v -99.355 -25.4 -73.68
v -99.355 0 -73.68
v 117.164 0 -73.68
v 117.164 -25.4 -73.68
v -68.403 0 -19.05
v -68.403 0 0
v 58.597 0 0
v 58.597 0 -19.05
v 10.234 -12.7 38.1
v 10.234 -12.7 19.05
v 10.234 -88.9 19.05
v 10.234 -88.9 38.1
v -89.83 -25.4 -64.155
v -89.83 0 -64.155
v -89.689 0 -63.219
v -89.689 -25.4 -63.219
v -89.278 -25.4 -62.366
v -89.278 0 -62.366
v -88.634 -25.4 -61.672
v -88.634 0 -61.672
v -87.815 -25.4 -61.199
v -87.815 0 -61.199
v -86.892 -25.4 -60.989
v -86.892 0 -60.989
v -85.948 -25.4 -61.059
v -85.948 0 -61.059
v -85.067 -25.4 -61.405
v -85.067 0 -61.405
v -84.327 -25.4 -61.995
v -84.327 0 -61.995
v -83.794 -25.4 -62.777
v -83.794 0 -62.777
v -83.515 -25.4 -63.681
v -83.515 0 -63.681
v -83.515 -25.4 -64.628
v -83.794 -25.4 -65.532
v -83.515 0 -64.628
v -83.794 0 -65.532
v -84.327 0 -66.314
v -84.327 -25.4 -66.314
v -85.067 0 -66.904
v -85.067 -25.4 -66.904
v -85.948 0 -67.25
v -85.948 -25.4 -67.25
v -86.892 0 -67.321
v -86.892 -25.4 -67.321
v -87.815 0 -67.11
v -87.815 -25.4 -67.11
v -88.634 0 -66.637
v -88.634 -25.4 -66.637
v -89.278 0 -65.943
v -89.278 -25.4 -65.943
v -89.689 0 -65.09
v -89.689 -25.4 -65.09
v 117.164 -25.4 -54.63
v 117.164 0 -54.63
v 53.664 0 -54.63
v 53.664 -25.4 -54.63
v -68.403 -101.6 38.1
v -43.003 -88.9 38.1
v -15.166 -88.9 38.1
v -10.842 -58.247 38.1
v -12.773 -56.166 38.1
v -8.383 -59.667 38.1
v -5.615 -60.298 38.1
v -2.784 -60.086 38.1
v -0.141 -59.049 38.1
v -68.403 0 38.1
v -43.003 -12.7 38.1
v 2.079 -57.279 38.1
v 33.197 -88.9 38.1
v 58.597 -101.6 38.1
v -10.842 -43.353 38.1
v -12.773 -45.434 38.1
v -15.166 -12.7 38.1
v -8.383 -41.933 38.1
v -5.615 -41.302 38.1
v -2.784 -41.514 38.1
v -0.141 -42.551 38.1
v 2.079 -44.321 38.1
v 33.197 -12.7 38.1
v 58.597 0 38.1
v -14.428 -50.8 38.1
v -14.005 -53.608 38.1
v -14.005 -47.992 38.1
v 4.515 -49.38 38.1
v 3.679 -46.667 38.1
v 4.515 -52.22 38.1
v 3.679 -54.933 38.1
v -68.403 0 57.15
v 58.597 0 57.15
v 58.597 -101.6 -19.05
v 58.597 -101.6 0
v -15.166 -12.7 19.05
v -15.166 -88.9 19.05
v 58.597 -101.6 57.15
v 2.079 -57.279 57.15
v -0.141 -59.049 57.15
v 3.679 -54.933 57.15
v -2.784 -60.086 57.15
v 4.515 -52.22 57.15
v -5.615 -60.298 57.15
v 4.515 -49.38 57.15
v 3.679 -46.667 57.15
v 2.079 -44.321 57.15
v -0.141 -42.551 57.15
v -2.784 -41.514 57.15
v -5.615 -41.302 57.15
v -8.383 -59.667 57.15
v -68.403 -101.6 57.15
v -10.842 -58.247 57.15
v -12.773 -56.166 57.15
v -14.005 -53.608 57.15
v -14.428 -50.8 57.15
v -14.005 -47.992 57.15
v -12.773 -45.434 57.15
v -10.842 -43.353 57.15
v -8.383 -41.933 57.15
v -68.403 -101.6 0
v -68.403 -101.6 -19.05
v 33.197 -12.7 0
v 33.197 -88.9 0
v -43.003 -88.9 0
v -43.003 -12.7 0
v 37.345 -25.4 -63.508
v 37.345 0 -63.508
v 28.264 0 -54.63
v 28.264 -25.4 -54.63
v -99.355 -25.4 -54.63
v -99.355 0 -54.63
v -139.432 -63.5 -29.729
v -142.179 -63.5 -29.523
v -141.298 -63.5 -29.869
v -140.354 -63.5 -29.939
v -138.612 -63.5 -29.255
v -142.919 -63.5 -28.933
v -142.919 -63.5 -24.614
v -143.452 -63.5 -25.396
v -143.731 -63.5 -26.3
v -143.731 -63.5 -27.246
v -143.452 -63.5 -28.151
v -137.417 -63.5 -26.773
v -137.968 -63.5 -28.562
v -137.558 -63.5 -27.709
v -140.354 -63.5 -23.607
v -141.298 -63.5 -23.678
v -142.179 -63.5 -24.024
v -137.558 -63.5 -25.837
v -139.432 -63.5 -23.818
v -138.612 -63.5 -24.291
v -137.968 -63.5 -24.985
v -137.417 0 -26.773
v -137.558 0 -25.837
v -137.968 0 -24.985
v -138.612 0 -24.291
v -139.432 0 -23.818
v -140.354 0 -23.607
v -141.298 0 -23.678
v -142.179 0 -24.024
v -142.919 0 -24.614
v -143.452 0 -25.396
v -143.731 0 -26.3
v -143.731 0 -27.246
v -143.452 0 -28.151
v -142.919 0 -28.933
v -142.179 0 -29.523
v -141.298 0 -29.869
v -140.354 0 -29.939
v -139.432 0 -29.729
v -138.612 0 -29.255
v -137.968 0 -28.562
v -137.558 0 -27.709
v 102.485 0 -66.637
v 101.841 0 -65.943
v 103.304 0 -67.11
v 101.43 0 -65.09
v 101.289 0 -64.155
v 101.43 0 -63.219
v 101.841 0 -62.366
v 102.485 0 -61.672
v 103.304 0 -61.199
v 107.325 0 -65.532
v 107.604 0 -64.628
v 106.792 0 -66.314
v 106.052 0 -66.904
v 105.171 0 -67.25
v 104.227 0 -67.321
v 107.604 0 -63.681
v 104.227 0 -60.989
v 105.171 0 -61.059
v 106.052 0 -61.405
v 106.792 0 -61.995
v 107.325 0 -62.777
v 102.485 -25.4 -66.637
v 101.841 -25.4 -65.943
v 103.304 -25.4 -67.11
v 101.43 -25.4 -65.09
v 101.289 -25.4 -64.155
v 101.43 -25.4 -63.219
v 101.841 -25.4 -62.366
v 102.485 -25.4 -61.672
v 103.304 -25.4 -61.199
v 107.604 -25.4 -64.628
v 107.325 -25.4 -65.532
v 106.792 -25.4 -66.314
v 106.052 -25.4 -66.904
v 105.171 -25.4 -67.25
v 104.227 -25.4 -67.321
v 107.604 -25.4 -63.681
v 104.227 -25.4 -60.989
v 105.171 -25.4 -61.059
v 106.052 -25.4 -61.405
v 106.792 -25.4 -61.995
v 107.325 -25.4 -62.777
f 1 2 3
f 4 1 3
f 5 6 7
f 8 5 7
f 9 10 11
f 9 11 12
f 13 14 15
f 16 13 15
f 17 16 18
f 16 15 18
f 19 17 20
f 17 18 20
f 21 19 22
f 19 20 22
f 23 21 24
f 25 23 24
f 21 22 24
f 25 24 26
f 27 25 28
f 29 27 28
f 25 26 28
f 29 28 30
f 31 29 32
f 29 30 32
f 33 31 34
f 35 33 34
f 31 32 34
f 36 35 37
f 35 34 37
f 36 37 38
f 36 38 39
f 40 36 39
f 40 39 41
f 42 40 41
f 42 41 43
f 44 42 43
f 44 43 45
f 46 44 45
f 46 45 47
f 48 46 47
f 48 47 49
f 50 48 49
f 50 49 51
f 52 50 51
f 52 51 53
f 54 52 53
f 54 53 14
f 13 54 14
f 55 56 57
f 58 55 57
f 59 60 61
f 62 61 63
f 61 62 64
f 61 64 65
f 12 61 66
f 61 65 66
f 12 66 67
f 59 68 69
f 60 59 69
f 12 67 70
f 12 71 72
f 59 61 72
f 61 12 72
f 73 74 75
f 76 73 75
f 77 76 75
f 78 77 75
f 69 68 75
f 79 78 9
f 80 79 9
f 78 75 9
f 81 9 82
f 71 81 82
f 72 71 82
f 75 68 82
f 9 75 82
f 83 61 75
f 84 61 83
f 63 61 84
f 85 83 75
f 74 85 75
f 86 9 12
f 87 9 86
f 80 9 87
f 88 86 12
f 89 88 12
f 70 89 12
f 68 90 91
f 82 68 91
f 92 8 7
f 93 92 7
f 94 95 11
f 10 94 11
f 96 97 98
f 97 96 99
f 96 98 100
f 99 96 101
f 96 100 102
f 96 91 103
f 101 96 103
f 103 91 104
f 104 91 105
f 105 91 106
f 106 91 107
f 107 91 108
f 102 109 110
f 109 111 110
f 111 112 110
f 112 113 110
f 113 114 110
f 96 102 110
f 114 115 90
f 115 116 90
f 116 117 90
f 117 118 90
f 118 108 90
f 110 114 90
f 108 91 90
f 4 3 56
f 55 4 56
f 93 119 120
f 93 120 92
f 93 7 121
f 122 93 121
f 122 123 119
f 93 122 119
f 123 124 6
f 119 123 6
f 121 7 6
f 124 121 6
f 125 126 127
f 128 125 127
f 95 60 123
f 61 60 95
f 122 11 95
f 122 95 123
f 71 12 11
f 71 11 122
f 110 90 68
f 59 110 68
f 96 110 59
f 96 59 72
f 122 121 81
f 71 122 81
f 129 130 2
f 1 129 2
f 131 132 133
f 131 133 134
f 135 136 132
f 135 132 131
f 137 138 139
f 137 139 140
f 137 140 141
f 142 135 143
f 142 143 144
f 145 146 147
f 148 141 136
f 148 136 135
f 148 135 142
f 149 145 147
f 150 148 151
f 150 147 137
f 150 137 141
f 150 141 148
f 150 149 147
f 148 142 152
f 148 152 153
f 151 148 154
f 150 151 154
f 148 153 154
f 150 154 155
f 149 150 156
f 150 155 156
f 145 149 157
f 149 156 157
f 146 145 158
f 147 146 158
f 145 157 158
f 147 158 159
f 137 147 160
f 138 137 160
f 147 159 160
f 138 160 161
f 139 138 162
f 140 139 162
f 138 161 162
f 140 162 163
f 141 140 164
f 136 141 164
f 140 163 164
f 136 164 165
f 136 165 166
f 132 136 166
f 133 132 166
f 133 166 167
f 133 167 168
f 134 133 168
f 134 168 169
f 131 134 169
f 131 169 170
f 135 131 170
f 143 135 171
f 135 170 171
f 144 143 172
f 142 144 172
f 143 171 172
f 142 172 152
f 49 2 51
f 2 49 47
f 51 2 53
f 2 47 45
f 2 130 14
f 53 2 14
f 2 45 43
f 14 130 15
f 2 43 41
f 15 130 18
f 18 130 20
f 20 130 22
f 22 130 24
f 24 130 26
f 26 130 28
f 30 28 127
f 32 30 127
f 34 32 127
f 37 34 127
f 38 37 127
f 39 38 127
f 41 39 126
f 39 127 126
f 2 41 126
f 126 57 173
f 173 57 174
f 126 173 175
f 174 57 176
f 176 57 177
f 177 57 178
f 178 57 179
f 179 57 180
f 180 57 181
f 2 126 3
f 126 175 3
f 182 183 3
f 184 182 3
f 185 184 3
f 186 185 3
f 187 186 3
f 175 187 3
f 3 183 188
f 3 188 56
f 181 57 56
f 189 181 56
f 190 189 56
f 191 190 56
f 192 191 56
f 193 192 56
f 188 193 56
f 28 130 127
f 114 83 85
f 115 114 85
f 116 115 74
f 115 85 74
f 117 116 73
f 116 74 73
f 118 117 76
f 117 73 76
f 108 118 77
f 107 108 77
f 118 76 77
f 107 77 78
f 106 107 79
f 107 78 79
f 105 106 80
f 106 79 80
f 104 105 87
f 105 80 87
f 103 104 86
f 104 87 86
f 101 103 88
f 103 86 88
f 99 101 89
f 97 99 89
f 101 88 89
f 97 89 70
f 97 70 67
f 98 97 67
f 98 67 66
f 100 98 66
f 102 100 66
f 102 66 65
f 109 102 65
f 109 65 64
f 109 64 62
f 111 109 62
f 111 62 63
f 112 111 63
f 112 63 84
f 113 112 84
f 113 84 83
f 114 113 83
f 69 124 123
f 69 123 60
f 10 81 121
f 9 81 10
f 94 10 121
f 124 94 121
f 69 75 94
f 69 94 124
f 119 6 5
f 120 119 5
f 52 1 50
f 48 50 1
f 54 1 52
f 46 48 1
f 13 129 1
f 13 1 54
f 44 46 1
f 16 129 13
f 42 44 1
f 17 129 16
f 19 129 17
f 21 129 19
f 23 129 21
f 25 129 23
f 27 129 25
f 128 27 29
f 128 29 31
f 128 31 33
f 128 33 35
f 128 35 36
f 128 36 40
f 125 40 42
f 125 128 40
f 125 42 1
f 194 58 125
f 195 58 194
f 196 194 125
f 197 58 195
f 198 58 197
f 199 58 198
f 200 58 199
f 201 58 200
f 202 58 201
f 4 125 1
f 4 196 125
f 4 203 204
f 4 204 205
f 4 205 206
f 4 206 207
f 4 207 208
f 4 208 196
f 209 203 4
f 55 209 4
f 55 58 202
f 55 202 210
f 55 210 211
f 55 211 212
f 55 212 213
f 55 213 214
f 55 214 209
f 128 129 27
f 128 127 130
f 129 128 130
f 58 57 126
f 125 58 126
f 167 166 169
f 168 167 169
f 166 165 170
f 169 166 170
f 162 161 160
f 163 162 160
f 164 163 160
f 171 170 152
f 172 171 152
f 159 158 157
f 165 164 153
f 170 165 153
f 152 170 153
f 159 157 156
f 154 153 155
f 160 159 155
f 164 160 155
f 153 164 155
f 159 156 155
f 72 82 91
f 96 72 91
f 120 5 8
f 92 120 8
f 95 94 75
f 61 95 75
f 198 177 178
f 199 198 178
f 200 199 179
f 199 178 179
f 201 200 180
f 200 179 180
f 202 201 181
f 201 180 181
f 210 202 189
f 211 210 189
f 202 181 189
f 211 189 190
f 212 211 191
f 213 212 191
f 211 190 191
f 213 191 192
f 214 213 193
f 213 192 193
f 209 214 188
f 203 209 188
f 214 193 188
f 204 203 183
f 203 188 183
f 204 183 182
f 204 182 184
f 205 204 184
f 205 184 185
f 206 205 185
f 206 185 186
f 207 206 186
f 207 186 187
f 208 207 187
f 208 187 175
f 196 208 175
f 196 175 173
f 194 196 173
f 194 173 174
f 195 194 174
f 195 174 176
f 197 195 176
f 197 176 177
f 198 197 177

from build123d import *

# Parameters (mm, degrees)
F0_W      = 76.2
F0_H      = 38.1
F1_DEPTH  = 101.6
F2_W      = 76.2
F2_H      = 38.1
F3_DEPTH  = 12.7
F4_W      = 76.2
F4_H      = 38.1
F5_DEPTH  = 12.7
F6_W      = 25.4
F6_H      = 19.05
F7_DEPTH  = 88.901
F9_D      = 19.05
F9_DEPTH  = 19.05
F11_DEPTH = 25.4
F13_D     = 6.35
F14_R     = 3.175
F15_DEPTH = 63.5


with BuildPart() as f1:
    # F0 (on Front) → F1 (new body)
    with BuildSketch(Plane.XZ):
        Polygon((58.596868, 57.15), (-68.403132, 57.15), (-68.403132, 38.1), (-43.003132, 38.1), (33.196868, 38.1), (58.596868, 38.1), align=None)
        Polygon((33.196868, 0), (-43.003132, 0), (-68.403132, 0), (-68.403132, -19.05), (58.596868, -19.05), (58.596868, 0), align=None)
        with Locations((-4.903132, 19.05)):
            Rectangle(F0_W, F0_H)
    extrude(amount=F1_DEPTH)

    # F2 (on face) → F3 (cut)
    with BuildSketch(Plane.XZ.offset(101.6)):
        with Locations((-4.903132, 19.05)):
            Rectangle(F2_W, F2_H)
    extrude(amount=-F3_DEPTH, mode=Mode.SUBTRACT)

    # F4 (on face) → F5 (cut)
    with BuildSketch(Plane(origin=(0, 0, 0), x_dir=(-1, 0, 0), z_dir=(0, 1, 0))):
        with Locations((4.903132, 19.05)):
            Rectangle(F4_W, F4_H)
    extrude(amount=-F5_DEPTH, mode=Mode.SUBTRACT)

    # F6 (on face) → F7 (cut, through all)
    with BuildSketch(Plane.XZ.offset(88.9)):
        with Locations((-2.466307, 28.575)):
            Rectangle(F6_W, F6_H)
    extrude(amount=-F7_DEPTH, mode=Mode.SUBTRACT)

    # F9
    with Locations(Plane.XY.offset(57.15)):
        with Locations((-4.903132, -50.8)):
            Hole(F9_D / 2, depth=F9_DEPTH)


with BuildPart() as f11:
    # F10 (on Front) → F11 (new body)
    with BuildSketch(Plane.XZ):
        Polygon((117.16425, -73.67965), (117.16425, -54.62965), (53.66425, -54.62965), (37.344941, -63.508335), (28.26425, -54.62965), (-98.73575, -54.62965), (-99.354781, -54.62965), (-99.354781, -73.67965), align=None)
    extrude(amount=F11_DEPTH)

    # F13 (through all)
    with Locations(Plane.XZ.offset(25.4)):
        with Locations((-86.654781, -64.15465), (104.46425, -64.15465)):
            Hole(F13_D / 2)


with BuildPart() as f15:
    # F14 (on Front) → F15 (new body)
    with BuildSketch(Plane.XZ):
        with Locations((-140.591711, -26.773173)):
            Circle(F14_R)
    extrude(amount=F15_DEPTH)


solid = Compound([f1.part, f11.part, f15.part])
